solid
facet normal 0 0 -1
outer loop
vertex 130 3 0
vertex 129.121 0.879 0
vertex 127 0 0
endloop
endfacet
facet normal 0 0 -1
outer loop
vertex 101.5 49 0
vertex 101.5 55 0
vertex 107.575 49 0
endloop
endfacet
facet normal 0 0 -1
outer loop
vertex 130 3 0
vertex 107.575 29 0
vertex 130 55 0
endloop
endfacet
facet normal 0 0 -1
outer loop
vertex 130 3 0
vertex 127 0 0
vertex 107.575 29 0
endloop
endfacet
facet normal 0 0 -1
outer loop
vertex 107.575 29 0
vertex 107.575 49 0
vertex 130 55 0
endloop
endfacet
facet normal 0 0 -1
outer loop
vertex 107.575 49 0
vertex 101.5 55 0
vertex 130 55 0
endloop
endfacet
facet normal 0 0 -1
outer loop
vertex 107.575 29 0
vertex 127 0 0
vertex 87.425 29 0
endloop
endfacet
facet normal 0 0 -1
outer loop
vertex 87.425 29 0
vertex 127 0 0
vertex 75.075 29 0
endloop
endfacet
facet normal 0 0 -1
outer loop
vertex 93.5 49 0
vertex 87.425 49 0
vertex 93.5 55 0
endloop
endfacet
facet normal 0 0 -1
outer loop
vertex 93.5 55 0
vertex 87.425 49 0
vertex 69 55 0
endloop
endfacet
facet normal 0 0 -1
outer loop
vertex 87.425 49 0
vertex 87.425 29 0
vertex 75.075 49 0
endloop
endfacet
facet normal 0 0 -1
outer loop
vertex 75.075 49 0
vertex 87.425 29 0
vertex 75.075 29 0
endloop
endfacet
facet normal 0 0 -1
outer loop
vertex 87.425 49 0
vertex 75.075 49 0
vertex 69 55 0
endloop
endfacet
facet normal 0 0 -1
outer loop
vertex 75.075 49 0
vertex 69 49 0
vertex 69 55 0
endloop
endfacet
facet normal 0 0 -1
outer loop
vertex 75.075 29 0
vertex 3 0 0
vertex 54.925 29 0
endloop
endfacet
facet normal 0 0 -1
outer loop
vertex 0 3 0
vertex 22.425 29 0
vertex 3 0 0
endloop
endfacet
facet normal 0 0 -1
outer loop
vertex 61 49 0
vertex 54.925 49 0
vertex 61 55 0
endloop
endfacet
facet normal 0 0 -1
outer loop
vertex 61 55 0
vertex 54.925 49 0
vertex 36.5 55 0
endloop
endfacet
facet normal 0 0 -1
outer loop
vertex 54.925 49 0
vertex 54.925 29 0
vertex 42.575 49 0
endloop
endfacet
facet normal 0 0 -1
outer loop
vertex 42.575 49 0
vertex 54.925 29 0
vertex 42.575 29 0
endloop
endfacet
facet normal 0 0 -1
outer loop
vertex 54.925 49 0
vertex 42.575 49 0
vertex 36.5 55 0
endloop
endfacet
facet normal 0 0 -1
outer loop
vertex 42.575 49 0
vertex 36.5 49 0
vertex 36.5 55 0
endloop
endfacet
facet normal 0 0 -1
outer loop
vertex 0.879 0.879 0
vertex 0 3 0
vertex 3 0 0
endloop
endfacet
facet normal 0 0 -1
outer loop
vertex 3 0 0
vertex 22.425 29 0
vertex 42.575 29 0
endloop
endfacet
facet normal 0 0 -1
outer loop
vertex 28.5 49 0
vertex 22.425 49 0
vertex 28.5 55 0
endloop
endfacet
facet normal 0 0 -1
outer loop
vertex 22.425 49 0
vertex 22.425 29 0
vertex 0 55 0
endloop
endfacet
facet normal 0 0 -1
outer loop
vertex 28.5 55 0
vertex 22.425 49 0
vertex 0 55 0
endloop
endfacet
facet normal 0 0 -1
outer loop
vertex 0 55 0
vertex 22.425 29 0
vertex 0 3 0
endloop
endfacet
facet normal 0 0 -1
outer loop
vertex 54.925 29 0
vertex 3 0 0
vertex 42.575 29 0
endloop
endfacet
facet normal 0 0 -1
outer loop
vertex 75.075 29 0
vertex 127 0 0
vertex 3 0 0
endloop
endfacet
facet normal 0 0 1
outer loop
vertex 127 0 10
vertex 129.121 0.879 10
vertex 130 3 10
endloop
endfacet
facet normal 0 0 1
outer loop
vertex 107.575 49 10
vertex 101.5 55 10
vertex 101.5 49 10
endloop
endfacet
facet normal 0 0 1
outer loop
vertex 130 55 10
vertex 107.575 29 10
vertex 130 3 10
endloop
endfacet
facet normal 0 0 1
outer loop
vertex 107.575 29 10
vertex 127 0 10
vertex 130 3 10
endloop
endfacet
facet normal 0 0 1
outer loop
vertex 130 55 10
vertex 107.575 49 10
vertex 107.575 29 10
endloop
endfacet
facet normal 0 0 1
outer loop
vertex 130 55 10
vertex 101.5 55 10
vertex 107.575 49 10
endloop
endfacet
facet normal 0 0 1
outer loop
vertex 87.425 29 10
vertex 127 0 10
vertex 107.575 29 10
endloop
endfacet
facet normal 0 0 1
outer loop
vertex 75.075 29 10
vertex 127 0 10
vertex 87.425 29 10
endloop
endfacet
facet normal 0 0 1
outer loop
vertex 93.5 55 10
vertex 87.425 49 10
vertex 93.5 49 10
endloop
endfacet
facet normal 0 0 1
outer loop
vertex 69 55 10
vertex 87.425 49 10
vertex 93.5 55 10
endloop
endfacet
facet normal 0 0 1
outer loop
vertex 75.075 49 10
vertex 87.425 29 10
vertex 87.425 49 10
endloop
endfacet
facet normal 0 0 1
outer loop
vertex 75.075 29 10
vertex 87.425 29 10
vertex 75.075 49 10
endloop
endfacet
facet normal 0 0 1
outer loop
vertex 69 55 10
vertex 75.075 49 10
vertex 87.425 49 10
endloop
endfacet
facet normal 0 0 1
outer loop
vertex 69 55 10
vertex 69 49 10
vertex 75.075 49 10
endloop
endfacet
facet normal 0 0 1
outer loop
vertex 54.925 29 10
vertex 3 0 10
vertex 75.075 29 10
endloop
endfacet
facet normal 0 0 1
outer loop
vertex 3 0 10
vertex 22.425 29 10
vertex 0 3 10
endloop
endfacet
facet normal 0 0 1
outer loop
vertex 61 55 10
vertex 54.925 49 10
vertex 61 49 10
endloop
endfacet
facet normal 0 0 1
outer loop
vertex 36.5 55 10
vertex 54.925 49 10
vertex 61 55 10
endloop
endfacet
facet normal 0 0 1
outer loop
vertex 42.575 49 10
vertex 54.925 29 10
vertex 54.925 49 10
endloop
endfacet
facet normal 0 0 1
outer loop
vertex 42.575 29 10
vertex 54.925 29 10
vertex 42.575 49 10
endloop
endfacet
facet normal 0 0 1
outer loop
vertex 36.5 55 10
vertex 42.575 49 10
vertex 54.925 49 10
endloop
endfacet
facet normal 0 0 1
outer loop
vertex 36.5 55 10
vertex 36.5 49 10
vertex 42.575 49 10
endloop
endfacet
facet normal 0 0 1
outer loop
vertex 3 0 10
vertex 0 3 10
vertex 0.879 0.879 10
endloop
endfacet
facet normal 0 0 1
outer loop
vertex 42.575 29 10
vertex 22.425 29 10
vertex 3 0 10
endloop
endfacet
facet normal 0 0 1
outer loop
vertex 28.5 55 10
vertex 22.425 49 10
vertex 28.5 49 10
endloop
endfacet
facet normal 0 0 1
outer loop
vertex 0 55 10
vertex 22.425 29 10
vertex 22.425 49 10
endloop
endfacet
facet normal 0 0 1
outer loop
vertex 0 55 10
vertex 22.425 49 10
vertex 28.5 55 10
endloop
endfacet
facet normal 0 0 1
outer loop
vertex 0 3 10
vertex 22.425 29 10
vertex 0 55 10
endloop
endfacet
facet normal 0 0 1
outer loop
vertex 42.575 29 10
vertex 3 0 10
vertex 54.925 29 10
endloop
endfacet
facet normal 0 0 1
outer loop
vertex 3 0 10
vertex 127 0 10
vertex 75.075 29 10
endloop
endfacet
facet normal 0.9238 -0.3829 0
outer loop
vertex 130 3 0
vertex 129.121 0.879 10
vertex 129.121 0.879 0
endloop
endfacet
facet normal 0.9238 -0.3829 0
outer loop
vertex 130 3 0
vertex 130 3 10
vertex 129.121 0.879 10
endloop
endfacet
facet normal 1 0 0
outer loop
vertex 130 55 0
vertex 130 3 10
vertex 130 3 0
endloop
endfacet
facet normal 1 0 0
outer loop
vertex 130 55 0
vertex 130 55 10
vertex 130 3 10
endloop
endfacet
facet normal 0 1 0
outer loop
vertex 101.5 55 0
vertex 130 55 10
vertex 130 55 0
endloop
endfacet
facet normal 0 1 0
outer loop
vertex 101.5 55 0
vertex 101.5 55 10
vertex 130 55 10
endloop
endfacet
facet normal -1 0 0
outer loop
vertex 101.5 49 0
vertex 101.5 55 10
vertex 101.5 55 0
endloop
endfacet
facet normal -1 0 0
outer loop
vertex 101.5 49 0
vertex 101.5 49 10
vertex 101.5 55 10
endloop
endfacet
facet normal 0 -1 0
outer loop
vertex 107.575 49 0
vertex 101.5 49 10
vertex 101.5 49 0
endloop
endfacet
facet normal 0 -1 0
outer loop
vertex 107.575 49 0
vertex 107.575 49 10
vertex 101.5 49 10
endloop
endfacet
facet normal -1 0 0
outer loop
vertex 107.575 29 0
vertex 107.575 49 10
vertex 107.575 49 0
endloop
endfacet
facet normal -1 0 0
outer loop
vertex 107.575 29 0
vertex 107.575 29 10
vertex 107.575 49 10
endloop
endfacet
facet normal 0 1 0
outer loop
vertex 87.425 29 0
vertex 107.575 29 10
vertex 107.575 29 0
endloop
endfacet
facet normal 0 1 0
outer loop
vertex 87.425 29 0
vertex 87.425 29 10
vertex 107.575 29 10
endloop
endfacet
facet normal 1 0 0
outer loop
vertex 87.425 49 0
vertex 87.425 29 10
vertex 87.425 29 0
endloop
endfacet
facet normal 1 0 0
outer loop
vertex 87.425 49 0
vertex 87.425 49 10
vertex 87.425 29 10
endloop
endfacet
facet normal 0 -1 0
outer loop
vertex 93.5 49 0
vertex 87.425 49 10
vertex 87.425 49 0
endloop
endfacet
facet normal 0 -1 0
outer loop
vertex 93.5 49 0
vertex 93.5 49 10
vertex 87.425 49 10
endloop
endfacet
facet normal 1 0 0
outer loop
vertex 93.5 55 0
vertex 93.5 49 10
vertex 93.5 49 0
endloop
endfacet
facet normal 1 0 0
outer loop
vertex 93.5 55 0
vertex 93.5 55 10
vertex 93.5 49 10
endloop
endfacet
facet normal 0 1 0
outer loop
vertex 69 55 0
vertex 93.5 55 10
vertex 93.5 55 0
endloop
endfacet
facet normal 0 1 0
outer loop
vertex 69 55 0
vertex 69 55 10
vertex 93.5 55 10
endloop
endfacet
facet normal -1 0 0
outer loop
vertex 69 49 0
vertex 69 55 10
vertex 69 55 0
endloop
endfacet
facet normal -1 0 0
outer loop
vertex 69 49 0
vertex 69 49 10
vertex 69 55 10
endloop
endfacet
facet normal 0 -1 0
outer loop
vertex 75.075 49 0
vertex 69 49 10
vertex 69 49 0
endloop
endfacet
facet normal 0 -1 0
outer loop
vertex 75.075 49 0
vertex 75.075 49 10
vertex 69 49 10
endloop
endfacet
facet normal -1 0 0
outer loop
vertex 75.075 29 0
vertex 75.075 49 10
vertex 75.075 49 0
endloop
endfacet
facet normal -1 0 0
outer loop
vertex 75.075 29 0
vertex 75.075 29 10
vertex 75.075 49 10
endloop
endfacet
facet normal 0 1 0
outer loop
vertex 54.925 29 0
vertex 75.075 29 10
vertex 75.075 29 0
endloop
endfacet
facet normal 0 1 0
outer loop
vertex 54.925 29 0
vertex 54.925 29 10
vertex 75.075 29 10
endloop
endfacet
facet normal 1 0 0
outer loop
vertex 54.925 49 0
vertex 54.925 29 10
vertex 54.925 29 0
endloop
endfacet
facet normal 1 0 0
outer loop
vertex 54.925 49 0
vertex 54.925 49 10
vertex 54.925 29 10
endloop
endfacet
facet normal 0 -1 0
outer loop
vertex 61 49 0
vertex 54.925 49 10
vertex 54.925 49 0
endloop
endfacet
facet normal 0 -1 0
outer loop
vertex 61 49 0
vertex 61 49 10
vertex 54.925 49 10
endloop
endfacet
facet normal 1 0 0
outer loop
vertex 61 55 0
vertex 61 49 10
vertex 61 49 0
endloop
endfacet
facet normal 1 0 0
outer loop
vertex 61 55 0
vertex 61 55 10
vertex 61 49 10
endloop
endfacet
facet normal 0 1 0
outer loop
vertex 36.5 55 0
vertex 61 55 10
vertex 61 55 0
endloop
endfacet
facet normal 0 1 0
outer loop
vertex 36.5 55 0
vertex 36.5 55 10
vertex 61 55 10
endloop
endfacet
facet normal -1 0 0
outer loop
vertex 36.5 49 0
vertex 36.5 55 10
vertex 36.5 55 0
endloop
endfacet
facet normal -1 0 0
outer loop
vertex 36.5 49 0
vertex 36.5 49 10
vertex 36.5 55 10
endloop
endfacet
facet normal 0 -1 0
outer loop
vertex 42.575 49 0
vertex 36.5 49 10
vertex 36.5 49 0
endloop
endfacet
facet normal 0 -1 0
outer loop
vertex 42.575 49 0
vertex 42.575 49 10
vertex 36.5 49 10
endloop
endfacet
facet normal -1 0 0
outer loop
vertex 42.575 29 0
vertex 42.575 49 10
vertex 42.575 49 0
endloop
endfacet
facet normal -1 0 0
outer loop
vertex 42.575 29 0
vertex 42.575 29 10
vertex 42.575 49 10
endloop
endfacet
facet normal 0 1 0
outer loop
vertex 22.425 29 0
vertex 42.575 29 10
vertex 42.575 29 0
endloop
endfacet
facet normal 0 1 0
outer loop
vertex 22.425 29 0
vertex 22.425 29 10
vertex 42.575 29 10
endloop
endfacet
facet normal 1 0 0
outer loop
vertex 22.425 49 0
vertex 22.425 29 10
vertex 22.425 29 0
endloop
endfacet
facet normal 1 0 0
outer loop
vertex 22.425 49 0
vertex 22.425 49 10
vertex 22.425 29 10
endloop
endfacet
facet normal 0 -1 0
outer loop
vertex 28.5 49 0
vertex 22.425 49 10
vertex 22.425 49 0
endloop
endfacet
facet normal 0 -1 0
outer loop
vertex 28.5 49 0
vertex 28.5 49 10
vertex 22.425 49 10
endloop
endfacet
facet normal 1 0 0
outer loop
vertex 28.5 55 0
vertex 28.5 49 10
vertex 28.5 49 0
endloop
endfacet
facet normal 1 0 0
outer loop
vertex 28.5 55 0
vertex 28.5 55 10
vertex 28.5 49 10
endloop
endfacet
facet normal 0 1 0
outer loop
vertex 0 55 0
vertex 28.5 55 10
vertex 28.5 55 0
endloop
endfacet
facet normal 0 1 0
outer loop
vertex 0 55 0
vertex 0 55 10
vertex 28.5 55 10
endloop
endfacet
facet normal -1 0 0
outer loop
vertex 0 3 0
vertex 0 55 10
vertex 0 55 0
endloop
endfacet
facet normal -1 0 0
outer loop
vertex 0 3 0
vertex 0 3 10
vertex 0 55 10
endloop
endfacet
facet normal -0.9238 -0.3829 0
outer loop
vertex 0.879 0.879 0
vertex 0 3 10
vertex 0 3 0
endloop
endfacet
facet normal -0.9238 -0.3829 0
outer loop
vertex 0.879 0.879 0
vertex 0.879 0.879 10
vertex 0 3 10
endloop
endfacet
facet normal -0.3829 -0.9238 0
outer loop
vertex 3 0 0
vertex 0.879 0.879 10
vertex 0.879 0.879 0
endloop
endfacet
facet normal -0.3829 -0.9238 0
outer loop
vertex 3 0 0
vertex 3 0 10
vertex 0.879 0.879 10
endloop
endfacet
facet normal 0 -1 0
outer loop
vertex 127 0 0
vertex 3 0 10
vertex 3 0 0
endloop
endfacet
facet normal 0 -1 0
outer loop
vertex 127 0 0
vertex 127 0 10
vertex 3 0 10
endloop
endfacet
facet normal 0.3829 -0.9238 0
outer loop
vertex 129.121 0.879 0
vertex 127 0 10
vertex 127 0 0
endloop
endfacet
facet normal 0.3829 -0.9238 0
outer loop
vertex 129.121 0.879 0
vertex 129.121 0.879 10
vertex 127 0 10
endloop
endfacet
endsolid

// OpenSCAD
$fn = 32;

// ----------------------------------------------------------------------
// Window plate: 130 x 55 mm, 3 open windows
// ----------------------------------------------------------------------

// --- parameters (mm) ---
profile_height = 10;      // extrusion height
profile_points = 32;      // points of the closed outline

profile = [[0, 3], [0.879, 0.879], [3, 0], [127, 0], [129.121, 0.879], [130, 3], [130, 55], [101.5, 55], [101.5, 49], [107.575, 49], [107.575, 29], [87.425, 29], [87.425, 49], [93.5, 49], [93.5, 55], [69, 55], [69, 49], [75.075, 49], [75.075, 29], [54.925, 29], [54.925, 49], [61, 49], [61, 55], [36.5, 55], [36.5, 49], [42.575, 49], [42.575, 29], [22.425, 29], [22.425, 49], [28.5, 49], [28.5, 55], [0, 55]];  // single closed polygon, 32 points, counter clockwise

// --- the one profile operation ---
linear_extrude(height = profile_height) polygon(points = profile);
